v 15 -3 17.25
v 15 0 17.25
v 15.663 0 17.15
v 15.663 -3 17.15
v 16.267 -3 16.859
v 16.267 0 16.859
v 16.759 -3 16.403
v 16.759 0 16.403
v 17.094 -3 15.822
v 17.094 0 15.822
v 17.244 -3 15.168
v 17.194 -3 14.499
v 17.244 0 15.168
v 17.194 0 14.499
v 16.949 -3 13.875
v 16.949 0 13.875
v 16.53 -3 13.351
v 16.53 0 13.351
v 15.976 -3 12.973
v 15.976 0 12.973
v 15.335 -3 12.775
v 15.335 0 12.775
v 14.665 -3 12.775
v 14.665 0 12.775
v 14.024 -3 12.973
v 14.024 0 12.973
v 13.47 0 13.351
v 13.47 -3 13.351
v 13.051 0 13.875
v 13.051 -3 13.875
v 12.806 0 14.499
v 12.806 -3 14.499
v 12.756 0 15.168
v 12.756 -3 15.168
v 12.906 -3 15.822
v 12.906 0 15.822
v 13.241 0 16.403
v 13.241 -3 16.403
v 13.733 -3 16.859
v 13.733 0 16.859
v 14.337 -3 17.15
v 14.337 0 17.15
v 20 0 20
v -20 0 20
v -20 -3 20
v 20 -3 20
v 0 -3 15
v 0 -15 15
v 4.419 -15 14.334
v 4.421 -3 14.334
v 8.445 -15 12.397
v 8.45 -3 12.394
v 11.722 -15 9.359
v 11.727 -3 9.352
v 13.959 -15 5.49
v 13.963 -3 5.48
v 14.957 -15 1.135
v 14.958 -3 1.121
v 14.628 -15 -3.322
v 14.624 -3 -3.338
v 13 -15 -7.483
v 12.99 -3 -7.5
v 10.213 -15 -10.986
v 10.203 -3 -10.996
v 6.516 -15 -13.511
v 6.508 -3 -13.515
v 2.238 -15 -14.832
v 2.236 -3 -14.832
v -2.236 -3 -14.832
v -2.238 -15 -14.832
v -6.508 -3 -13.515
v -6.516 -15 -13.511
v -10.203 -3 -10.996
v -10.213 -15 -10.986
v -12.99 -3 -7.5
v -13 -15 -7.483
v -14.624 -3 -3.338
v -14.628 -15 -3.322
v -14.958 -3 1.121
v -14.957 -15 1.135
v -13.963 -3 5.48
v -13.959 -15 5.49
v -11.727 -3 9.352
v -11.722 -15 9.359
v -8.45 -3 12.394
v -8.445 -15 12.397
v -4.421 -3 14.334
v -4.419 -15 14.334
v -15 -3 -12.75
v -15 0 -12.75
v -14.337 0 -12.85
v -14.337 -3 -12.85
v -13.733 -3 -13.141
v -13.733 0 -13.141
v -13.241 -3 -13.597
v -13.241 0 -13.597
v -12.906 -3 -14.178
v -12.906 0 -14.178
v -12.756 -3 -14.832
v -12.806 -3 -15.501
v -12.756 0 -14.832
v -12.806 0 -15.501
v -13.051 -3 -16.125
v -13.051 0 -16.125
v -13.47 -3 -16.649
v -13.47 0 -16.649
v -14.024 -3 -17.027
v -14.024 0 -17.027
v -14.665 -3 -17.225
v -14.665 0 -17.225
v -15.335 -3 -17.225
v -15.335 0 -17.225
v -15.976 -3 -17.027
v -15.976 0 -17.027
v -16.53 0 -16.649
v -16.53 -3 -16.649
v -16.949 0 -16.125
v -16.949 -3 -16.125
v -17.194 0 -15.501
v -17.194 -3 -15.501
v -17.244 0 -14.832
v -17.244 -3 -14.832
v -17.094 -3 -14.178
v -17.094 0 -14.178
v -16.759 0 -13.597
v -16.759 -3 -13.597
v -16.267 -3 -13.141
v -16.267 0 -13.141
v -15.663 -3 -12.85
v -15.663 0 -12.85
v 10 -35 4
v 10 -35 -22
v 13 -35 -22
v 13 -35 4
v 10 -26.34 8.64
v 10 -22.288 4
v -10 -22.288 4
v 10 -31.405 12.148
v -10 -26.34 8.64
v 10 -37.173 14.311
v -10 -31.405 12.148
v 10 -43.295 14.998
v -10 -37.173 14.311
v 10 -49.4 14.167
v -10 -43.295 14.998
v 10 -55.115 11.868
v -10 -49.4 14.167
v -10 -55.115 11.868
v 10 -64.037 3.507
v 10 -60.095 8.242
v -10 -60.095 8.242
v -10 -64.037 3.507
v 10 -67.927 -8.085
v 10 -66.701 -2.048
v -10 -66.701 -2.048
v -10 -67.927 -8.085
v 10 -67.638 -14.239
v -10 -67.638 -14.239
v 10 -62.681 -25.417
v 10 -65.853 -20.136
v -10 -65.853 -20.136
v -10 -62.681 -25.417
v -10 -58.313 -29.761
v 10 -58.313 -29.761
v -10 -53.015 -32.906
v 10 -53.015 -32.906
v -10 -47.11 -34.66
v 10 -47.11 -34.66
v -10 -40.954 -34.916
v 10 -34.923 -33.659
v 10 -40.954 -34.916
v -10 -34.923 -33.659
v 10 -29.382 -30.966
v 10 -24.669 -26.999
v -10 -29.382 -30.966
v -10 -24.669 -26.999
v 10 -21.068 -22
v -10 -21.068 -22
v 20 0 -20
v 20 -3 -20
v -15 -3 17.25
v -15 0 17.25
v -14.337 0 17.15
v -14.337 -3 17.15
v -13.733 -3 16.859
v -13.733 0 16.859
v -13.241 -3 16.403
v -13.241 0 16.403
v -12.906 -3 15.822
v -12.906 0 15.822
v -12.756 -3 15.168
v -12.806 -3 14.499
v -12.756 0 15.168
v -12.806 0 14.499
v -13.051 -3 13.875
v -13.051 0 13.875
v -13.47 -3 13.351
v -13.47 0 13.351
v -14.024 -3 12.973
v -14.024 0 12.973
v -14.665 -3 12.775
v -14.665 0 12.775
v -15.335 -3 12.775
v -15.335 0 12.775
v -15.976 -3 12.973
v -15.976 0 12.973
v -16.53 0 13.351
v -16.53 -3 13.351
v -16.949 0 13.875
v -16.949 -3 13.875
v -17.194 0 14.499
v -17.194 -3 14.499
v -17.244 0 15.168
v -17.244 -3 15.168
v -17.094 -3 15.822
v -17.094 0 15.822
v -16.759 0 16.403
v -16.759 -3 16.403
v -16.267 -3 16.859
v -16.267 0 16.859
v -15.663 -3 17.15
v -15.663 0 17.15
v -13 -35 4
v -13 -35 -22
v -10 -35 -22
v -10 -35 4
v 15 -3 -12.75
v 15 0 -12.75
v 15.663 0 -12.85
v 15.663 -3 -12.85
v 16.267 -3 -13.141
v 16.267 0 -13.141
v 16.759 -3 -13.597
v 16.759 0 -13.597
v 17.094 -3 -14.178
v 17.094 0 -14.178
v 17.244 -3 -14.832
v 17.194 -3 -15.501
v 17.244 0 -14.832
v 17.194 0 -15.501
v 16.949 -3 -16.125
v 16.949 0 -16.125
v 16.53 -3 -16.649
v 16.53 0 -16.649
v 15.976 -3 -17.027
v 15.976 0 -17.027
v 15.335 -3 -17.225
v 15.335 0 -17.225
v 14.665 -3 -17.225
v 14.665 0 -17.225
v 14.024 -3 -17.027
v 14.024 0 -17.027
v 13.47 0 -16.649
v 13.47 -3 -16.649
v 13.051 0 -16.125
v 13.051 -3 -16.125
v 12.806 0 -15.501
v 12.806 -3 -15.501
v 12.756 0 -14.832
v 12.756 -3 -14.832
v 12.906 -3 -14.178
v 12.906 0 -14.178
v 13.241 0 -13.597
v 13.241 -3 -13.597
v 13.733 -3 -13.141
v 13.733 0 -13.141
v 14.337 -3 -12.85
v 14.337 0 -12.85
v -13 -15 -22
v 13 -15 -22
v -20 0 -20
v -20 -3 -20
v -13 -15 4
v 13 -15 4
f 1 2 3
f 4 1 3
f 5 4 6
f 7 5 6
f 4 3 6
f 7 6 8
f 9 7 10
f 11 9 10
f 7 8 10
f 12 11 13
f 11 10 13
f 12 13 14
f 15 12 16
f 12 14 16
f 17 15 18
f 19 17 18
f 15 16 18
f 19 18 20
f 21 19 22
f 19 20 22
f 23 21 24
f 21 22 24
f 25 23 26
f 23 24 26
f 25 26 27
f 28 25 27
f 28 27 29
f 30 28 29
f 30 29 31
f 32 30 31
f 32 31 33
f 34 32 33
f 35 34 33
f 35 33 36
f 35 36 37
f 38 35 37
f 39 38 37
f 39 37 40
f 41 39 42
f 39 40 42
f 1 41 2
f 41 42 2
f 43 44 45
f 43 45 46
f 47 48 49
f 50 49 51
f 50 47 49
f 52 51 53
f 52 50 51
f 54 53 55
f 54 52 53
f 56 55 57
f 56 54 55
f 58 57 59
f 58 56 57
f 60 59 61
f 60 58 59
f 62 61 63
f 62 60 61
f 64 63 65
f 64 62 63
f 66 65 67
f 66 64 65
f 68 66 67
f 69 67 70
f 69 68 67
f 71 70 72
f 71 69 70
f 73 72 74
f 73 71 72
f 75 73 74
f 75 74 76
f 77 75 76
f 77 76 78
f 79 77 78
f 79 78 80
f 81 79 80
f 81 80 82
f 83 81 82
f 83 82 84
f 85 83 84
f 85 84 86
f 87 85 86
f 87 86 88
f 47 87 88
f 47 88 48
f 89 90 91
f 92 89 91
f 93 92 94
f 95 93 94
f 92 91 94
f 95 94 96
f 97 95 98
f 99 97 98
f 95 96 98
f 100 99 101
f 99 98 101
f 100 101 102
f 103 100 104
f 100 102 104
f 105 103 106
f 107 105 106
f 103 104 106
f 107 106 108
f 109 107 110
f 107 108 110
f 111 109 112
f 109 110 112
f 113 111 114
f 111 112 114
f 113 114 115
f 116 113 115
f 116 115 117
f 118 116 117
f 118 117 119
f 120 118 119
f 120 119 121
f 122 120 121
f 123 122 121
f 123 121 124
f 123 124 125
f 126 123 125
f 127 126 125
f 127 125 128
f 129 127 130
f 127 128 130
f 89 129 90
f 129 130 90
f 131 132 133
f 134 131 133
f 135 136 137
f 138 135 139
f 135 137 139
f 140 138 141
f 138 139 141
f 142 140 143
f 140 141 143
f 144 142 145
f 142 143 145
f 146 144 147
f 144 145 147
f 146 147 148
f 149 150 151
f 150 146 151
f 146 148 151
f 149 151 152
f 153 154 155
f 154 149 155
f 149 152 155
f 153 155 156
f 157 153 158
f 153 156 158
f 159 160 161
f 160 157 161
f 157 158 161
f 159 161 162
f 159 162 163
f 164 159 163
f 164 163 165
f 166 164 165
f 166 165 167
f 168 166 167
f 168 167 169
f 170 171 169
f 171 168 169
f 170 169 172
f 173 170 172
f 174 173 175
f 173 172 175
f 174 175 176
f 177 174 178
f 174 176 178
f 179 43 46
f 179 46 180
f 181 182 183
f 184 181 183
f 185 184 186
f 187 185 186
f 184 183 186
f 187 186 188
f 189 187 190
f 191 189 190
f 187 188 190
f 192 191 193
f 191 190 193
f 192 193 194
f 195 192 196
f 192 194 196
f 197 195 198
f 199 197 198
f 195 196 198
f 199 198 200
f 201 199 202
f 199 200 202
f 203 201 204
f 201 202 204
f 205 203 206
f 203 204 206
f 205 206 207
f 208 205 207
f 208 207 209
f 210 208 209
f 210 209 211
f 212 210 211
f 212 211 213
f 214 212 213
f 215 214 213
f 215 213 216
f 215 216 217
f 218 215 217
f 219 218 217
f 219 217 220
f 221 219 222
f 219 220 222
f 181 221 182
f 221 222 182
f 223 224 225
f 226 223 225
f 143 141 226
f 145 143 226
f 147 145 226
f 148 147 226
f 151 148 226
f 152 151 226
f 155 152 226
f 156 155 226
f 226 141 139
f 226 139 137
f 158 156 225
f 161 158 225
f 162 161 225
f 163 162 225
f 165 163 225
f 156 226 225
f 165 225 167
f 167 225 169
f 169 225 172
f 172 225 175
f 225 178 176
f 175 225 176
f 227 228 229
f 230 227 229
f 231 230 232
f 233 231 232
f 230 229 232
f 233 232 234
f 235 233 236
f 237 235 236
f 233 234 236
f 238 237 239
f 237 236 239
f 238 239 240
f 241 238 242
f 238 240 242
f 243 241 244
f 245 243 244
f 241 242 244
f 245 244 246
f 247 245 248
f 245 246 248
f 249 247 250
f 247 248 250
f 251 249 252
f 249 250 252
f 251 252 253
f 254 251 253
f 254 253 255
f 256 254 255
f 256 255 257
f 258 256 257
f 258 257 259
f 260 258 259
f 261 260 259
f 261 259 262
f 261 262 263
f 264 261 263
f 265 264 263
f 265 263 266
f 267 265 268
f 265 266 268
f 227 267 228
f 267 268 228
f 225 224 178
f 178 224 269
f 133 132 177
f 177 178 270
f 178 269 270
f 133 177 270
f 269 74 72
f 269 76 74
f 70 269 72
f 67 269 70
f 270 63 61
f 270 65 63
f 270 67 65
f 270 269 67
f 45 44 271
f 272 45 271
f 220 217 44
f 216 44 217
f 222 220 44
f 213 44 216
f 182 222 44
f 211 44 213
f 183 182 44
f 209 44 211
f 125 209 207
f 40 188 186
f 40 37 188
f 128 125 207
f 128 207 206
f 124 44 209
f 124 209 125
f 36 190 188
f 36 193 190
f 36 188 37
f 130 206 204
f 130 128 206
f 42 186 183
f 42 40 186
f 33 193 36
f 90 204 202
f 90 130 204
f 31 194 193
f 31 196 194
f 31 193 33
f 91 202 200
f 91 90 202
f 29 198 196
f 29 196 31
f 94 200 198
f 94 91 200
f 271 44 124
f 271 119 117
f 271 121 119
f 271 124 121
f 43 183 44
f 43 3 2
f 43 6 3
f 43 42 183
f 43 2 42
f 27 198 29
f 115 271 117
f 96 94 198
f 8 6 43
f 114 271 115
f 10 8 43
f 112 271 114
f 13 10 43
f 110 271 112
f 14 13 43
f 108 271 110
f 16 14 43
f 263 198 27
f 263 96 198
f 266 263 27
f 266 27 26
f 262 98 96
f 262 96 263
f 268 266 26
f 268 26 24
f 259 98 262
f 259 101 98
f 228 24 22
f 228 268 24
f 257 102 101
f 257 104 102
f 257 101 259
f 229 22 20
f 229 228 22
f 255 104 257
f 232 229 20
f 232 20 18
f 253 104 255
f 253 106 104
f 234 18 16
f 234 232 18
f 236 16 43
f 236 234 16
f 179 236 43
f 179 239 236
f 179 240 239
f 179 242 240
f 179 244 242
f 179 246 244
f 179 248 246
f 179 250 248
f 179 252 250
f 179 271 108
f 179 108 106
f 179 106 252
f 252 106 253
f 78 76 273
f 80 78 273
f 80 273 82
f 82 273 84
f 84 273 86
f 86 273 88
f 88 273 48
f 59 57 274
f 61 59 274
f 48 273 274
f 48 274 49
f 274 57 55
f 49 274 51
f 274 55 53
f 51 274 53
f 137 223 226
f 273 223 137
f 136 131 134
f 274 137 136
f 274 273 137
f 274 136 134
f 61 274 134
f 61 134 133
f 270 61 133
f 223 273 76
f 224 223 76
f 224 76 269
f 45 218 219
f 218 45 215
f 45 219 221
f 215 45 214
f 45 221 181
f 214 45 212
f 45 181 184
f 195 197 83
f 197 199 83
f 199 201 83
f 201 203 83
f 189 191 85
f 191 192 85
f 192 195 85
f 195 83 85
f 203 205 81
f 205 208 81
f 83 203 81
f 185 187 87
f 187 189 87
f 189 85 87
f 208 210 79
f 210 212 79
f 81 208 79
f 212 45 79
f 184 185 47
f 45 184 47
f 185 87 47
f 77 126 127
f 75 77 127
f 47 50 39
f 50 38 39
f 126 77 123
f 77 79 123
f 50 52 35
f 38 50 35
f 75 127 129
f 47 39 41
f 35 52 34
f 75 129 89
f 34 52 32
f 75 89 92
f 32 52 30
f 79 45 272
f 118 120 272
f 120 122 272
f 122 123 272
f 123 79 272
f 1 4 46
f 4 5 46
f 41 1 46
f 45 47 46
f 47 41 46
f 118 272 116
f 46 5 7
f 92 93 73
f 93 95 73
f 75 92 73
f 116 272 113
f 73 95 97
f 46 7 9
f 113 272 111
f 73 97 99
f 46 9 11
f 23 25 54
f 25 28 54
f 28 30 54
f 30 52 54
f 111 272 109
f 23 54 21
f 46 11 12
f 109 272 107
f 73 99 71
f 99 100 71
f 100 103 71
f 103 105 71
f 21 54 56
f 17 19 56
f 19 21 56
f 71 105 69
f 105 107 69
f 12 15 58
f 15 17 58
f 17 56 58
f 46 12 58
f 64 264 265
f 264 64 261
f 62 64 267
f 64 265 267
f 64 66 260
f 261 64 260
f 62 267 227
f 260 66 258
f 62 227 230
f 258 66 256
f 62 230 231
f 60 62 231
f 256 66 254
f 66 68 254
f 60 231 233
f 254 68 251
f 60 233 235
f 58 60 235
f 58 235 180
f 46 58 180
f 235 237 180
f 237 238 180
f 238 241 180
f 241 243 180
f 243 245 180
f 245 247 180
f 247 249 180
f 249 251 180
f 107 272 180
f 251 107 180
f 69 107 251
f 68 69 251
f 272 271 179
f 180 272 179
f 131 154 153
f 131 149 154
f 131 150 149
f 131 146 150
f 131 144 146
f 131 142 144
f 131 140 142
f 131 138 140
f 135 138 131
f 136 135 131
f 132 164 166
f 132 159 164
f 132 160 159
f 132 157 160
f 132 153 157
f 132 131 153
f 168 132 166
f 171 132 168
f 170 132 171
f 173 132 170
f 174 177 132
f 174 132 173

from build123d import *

# Parameters (mm, degrees)
SK_PLATE_W              = 40
SK_PLATE_H              = 40
EX_PLATE_DEPTH          = 3
SK_PLATEHOLES_4X_R      = 2.25
CUT_PLATEHOLES_4X_DEPTH = 3
SK_SWIVEL_R             = 15
EX_SWIVEL_DEPTH         = 12
SK_FORK_W               = 26
SK_FORK_H               = 26
EX_FORK_DEPTH           = 20
SK_WHEEL_R              = 25
EX_WHEEL_DEPTH          = 20


with BuildPart() as part:
    # SK_Plate → EX_Plate (new body)
    with BuildSketch(Plane(origin=(0, 0, 0), x_dir=(1, 0, 0), z_dir=(0, 1, 0))):
        Rectangle(SK_PLATE_W, SK_PLATE_H)
    extrude(amount=-EX_PLATE_DEPTH)

    # SK_PlateHoles_4x → CUT_PlateHoles_4x (cut)
    with BuildSketch(Plane(origin=(0, 0, 0), x_dir=(1, 0, 0), z_dir=(0, 1, 0))):
        with Locations((15, -15)):
            Circle(SK_PLATEHOLES_4X_R)
        with Locations((-15, -15)):
            Circle(SK_PLATEHOLES_4X_R)
        with Locations((15, 15)):
            Circle(SK_PLATEHOLES_4X_R)
        with Locations((-15, 15)):
            Circle(SK_PLATEHOLES_4X_R)
    extrude(amount=-CUT_PLATEHOLES_4X_DEPTH, mode=Mode.SUBTRACT)

    # SK_Swivel → EX_Swivel (add)
    with BuildSketch(Plane(origin=(0, -3, 0), x_dir=(1, 0, 0), z_dir=(0, 1, 0))):
        Circle(SK_SWIVEL_R)
    extrude(amount=-EX_SWIVEL_DEPTH)

    # SK_Fork → EX_Fork (add)
    with BuildSketch(Plane(origin=(0, -15, 0), x_dir=(1, 0, 0), z_dir=(0, 1, 0))):
        with Locations((0, 9)):
            Rectangle(SK_FORK_W, SK_FORK_H)
    extrude(amount=-EX_FORK_DEPTH)

    # SK_Wheel → EX_Wheel (add)
    with BuildSketch(Plane(origin=(-10, 0, 0), x_dir=(0, 0, -1), z_dir=(1, 0, 0))):
        with Locations((10, -43)):
            Circle(SK_WHEEL_R)
    extrude(amount=EX_WHEEL_DEPTH)


solid = part.part
